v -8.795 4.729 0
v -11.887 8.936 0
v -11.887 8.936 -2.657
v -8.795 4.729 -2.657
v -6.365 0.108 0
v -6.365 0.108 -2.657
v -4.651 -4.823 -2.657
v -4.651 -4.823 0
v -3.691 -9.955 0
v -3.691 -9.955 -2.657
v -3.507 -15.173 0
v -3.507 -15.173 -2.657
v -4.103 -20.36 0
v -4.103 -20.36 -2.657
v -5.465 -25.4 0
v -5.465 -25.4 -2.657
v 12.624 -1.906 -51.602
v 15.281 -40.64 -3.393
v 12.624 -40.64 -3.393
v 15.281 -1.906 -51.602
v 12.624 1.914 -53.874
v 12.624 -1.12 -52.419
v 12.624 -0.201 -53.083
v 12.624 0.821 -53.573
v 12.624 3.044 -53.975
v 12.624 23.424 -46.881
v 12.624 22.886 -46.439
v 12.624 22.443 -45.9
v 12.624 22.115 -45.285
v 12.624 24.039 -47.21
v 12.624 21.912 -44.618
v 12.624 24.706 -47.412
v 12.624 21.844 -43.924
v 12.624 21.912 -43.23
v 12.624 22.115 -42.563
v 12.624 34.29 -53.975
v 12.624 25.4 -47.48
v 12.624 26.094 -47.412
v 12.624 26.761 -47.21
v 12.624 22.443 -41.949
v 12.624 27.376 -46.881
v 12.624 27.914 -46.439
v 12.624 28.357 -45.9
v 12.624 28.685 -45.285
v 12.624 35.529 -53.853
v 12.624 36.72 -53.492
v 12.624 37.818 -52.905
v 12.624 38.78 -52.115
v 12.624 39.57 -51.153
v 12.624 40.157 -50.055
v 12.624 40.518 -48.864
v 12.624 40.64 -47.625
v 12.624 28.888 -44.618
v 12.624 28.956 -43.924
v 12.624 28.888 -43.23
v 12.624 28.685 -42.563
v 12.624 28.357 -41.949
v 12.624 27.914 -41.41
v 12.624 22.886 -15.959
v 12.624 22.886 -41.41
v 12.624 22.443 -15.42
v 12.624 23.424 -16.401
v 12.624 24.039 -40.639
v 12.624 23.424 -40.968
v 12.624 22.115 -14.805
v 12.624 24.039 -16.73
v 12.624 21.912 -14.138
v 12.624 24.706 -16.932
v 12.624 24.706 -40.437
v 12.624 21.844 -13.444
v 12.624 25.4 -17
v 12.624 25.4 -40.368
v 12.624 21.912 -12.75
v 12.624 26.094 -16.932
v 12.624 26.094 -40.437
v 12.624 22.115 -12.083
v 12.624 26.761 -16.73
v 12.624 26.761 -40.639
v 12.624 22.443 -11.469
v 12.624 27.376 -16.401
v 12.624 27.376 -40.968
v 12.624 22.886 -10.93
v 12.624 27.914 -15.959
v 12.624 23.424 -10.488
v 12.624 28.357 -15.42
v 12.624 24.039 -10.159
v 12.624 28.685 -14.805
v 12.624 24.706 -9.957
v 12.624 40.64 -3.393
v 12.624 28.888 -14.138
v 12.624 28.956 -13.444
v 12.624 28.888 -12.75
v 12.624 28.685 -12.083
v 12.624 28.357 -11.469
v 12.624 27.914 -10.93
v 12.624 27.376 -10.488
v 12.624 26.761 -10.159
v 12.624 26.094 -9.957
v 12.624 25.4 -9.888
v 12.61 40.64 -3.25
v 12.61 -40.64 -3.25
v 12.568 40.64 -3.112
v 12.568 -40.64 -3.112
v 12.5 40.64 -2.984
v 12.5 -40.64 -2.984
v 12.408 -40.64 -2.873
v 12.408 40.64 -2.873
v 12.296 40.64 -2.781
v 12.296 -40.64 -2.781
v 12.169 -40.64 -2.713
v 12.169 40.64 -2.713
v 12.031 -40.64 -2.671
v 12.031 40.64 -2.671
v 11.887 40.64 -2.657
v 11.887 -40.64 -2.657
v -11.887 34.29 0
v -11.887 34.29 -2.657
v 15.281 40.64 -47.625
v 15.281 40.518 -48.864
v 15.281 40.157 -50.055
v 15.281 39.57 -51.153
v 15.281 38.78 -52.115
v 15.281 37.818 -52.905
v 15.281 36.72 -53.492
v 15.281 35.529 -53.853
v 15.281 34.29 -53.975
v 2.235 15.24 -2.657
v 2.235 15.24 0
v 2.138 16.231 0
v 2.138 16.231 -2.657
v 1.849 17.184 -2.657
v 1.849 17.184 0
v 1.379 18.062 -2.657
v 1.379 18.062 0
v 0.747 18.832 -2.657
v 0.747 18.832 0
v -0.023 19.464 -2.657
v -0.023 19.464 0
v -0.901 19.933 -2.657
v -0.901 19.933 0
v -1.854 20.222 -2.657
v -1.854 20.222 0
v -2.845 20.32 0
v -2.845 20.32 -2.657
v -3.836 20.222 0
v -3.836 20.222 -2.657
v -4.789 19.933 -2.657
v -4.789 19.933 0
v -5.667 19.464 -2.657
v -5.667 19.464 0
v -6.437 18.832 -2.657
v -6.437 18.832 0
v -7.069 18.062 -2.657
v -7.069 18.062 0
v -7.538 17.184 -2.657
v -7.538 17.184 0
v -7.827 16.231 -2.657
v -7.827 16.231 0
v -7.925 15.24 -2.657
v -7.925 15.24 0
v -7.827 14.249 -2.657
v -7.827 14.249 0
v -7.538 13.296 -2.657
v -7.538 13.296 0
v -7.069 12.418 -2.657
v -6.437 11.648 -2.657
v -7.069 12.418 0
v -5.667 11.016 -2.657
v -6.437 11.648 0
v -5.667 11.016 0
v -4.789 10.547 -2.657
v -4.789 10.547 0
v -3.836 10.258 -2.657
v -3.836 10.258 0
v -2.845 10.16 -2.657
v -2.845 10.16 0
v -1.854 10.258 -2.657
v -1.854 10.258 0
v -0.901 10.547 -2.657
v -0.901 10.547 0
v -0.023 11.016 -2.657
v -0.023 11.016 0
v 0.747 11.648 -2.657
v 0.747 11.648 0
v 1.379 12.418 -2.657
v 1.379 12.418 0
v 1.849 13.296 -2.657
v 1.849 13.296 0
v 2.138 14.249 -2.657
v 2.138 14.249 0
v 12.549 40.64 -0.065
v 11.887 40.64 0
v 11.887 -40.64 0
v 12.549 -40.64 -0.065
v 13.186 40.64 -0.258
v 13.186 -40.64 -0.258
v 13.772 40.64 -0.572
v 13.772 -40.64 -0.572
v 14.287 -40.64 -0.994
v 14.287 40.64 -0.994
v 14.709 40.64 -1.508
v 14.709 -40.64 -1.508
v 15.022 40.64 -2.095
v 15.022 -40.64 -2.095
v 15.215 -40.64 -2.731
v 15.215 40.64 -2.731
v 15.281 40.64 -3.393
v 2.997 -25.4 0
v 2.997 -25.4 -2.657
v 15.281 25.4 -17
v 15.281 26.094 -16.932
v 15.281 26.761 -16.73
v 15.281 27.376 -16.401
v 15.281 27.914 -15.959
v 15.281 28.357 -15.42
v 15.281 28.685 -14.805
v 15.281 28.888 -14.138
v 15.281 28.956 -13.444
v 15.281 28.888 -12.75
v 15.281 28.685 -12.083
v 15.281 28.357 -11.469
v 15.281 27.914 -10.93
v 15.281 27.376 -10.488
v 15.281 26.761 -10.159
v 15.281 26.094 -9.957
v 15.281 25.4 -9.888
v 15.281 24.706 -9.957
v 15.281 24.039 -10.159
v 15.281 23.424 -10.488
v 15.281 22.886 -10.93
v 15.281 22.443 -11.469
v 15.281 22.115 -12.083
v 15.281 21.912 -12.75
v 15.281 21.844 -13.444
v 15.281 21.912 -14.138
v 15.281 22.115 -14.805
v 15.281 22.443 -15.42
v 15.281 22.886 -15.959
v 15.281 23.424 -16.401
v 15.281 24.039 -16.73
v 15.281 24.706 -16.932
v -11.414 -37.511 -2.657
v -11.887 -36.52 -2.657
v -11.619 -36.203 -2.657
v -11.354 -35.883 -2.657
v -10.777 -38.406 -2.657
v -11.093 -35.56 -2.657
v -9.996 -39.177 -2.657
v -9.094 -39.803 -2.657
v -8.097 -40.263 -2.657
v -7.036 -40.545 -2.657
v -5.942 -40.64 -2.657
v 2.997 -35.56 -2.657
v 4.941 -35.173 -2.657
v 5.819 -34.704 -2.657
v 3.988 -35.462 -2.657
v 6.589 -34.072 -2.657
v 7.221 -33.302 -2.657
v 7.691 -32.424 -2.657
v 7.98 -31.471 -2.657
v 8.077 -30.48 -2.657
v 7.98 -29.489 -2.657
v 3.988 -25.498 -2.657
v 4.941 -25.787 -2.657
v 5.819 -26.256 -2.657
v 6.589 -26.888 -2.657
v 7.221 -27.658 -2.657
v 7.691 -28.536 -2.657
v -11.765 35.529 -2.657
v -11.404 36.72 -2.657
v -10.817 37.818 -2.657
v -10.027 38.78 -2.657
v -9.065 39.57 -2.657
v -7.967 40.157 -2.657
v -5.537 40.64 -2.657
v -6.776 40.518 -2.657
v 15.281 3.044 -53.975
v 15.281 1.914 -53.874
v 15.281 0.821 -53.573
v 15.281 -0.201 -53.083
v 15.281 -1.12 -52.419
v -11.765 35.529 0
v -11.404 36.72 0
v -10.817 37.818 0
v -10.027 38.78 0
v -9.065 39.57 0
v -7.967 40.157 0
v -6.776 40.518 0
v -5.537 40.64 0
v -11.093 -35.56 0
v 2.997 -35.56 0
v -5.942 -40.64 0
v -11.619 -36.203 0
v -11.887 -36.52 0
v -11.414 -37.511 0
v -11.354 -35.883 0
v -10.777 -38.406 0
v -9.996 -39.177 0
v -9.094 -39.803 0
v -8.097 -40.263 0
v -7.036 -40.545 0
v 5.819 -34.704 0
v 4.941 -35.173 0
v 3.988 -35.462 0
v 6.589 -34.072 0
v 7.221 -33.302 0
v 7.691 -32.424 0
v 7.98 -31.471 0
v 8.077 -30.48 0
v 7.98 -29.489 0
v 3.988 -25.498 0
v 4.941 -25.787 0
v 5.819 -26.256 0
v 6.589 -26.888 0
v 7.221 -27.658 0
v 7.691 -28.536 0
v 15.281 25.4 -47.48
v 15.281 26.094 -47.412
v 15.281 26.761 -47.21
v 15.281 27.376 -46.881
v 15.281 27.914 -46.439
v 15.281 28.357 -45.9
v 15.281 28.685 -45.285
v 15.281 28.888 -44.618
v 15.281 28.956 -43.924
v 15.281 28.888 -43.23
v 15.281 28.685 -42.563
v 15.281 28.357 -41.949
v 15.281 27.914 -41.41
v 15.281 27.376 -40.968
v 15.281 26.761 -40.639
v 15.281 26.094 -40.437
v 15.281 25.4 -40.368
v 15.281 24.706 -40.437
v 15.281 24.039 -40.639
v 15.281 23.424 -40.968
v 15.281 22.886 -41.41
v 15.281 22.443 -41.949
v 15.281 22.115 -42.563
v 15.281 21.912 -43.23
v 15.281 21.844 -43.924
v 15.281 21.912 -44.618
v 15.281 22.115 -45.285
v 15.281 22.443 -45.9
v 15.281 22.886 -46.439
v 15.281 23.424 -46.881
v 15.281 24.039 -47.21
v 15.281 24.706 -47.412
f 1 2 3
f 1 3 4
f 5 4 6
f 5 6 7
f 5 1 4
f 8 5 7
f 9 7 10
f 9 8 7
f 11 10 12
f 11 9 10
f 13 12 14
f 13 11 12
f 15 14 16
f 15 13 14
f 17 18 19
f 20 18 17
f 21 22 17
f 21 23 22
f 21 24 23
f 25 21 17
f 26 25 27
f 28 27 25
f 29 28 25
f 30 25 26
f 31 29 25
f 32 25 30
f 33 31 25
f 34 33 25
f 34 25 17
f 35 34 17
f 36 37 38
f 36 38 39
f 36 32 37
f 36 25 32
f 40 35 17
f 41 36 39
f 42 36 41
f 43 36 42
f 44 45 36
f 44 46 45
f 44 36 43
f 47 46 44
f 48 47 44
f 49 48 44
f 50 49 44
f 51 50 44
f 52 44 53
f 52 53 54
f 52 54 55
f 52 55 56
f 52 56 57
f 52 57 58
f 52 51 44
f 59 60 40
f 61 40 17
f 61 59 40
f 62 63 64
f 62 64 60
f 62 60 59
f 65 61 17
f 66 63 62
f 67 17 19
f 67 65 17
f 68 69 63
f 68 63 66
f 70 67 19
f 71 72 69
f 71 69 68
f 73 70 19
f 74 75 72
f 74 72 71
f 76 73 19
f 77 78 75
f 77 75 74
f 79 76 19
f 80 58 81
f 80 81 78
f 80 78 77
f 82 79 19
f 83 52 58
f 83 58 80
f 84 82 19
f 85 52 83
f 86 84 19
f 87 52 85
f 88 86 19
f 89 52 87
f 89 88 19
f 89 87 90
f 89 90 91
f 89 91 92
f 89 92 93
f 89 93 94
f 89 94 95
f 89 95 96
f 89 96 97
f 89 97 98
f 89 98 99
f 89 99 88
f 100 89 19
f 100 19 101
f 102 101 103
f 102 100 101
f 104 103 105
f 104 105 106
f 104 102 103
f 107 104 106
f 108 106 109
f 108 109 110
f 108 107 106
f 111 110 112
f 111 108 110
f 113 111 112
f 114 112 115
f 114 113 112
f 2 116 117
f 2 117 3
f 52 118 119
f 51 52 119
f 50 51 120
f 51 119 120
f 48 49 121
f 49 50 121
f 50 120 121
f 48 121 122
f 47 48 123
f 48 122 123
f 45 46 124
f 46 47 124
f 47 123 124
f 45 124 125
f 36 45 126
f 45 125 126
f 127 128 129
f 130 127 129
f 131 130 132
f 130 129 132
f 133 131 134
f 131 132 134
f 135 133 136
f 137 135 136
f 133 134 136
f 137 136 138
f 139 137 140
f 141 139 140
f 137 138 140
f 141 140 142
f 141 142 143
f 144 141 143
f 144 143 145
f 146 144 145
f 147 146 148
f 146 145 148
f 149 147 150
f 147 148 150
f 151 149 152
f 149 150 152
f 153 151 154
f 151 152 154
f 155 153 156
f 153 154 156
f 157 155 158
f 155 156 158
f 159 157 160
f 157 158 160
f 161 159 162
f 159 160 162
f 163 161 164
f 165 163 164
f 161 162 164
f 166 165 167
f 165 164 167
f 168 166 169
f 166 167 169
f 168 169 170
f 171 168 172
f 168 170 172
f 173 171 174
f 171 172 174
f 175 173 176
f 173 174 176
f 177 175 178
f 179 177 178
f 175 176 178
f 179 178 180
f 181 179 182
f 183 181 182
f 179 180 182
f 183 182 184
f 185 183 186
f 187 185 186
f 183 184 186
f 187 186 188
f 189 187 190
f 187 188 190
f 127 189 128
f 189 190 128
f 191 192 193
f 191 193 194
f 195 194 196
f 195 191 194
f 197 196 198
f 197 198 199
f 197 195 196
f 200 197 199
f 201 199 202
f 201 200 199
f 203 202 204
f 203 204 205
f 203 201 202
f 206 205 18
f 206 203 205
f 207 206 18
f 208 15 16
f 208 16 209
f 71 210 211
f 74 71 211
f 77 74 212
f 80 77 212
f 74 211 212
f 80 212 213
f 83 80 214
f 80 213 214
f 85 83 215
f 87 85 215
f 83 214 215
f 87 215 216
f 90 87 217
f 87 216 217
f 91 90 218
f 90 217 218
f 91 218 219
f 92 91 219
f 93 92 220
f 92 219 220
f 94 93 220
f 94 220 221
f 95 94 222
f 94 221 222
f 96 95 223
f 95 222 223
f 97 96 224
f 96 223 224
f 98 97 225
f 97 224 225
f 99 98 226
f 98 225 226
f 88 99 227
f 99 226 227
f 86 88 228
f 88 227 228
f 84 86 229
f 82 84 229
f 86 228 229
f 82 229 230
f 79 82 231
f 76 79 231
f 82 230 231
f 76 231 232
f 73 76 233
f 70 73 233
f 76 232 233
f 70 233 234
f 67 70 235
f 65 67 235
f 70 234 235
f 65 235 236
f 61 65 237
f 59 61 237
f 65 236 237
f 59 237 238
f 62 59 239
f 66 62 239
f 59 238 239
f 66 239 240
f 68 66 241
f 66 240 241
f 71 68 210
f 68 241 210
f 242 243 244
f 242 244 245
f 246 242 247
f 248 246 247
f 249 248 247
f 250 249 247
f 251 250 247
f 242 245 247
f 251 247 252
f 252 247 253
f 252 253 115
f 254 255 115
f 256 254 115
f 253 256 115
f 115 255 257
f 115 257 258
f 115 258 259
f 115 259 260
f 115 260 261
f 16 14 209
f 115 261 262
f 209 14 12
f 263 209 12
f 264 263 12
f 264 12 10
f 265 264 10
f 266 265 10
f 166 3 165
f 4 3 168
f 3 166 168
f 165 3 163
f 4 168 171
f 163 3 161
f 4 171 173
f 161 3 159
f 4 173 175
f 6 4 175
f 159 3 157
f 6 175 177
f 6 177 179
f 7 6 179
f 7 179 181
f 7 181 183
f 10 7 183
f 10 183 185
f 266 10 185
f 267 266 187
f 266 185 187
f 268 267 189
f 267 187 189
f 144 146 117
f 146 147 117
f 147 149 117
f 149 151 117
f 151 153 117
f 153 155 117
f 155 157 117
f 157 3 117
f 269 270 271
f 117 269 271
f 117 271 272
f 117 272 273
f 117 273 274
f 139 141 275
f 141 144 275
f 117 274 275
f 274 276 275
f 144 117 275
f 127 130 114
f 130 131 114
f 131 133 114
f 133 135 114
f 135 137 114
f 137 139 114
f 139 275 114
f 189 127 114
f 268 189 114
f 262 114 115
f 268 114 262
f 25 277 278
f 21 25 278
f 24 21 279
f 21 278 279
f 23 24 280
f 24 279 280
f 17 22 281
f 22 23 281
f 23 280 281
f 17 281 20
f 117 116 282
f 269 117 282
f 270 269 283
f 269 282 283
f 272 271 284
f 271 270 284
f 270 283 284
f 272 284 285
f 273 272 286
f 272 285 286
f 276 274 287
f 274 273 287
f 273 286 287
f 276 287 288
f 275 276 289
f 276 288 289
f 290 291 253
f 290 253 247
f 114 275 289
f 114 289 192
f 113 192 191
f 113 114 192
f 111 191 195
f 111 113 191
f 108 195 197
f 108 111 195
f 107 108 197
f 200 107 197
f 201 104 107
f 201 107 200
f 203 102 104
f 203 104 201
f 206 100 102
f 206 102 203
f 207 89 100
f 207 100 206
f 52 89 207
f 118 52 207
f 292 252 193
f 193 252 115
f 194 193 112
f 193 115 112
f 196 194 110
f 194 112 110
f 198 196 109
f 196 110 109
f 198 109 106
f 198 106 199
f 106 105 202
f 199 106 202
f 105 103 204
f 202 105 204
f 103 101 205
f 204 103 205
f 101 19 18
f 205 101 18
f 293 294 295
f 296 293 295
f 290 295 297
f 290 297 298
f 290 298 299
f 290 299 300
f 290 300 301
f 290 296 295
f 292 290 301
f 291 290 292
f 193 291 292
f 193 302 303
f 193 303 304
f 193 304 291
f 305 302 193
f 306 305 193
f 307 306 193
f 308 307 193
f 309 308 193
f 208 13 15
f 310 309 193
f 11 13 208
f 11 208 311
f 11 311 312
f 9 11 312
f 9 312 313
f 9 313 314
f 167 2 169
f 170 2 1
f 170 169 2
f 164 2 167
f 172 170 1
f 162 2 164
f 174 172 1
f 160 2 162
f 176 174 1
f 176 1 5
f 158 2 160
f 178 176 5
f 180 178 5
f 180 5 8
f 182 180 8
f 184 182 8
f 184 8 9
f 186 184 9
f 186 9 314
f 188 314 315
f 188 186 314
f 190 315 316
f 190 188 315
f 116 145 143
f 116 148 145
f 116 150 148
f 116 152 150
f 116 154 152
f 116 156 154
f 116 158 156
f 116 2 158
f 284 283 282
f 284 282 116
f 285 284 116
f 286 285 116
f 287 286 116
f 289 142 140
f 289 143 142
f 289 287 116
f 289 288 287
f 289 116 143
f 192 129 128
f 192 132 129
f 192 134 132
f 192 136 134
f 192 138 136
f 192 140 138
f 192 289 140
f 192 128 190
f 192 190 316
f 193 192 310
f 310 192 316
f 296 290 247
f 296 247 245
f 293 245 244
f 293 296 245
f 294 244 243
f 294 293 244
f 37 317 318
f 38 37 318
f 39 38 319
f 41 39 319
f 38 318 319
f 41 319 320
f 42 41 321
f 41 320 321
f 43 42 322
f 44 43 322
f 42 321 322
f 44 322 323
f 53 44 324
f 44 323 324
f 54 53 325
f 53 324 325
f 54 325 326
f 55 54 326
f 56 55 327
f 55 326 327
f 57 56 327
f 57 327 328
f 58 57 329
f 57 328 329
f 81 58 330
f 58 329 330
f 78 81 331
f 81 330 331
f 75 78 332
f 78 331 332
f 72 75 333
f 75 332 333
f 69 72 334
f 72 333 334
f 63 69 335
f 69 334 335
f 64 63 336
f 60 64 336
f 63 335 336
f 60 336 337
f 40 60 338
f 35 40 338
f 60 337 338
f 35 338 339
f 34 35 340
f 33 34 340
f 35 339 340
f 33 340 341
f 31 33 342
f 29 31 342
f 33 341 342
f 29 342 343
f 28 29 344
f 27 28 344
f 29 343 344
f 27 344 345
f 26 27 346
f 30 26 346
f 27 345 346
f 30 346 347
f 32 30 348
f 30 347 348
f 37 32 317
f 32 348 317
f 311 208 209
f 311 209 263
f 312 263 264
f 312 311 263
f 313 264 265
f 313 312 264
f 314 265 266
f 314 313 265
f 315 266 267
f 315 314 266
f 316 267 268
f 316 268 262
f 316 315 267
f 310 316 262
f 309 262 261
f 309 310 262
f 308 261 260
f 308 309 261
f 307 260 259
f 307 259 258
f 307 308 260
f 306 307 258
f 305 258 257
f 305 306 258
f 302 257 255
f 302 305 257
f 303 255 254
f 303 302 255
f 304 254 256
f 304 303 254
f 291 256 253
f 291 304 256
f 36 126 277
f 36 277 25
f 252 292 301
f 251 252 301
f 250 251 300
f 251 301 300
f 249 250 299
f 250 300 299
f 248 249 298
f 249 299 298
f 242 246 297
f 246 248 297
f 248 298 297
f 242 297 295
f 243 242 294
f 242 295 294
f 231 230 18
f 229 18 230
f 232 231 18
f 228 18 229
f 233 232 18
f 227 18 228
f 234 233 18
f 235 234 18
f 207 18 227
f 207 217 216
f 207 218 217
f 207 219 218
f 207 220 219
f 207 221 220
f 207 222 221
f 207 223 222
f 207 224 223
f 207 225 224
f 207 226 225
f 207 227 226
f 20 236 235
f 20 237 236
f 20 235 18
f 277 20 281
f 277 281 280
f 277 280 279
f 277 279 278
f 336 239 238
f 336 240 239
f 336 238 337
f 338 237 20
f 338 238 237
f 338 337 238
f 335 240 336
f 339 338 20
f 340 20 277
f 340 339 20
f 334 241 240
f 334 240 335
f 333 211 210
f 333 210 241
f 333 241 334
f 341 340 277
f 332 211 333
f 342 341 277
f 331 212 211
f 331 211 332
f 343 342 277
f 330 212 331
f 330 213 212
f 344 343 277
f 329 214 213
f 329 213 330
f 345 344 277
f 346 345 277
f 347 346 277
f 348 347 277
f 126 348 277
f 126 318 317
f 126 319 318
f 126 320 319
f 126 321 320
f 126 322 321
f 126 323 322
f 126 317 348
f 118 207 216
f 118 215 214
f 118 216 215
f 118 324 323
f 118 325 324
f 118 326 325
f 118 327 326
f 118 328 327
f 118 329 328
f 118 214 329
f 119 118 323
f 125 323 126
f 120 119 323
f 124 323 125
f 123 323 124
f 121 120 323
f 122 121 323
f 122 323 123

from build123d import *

# Parameters (mm, degrees)
SKETCH2_R          = 5.08
BASE_FLANGE2_DEPTH = 2.65684
EDGE_FLANGE2_DEPTH = 81.28
SKETCH18_R         = 3.556
CUT_EXTRUDE1_DEPTH = 2.65684
FILLET1_R          = 6.35


# Sheet-metal steps are written as plain solids
with BuildPart() as part:
    # Sketch2 → Base-Flange2 (new body)
    with BuildSketch(Plane.XY):
        with BuildLine():
            Line((-11.8872, -36.520431679), (-11.8872, -40.64))
            Line((-11.8872, -40.64), (11.8872, -40.64))
            Line((11.8872, -40.64), (11.8872, 40.64))
            Line((11.8872, 40.64), (-11.8872, 40.64))
            Line((-11.8872, 40.64), (-11.8872, 8.936031679))
            ThreePointArc((-11.8872, 8.936031679), (-4.075086446, -7.37142183), (-5.465240134, -25.4))
            Line((-5.465240134, -25.4), (2.9972, -25.4))
            ThreePointArc((2.9972, -25.4), (8.0772, -30.48), (2.9972, -35.56))
            Line((2.9972, -35.56), (-11.093291287, -35.56))
            ThreePointArc((-11.093291287, -35.56), (-11.485961922, -36.043756834), (-11.8872, -36.520431679))
        make_face()
        with Locations((-2.8448, 15.24)):
            Circle(SKETCH2_R, mode=Mode.SUBTRACT)
    extrude(amount=-BASE_FLANGE2_DEPTH)

    # Edge-Flange2 section (across the edge) → Edge-Flange2 (add)
    with BuildSketch(Plane(origin=(12.6238, 40.64, -2.65684), x_dir=(-1, 0, 0), z_dir=(0, -1, 0))):
        with BuildLine():
            Line((-2.65684, 0.7366), (-2.65684, 51.31816))
            Line((-2.65684, 51.31816), (0, 51.31816))
            Line((0, 51.31816), (0, 0.7366))
            ThreePointArc((0, 0.7366), (0.215745145, 0.215745145), (0.7366, 0))
            Line((0.7366, 0), (0.7366, -2.65684))
            ThreePointArc((0.7366, -2.65684), (-1.662924436, -1.662924436), (-2.65684, 0.7366))
        make_face()
    extrude(amount=EDGE_FLANGE2_DEPTH)

    # Sketch18 → Cut-Extrude1 (cut)
    with BuildSketch(Plane(origin=(15.28064, 0, 0), x_dir=(0, 0, -1), z_dir=(1, 0, 0))):
        with Locations((13.44422, 25.4)):
            Circle(SKETCH18_R)
        with Locations((43.92422, 25.4)):
            Circle(SKETCH18_R)
        Polygon((53.975, 0), (53.975, -40.64), (3.39344, -40.64), align=None)
    extrude(amount=-CUT_EXTRUDE1_DEPTH, mode=Mode.SUBTRACT)

    # Fillet1
    # the kernel refuses this fillet: 6.35 mm, written as the material it takes off along each edge
    with BuildSketch(Plane(origin=(-11.8872, 40.64, 15.875), x_dir=(0, -1, 0), z_dir=(0, 0, -1)), Plane(origin=(31.15564, 40.64, -53.975), x_dir=(0, 0, 1), z_dir=(-1, 0, 0))) as fillet1_piece_1:
        with BuildLine():
            CenterArc((FILLET1_R, -FILLET1_R), FILLET1_R, 90, 90)
            Line((0, -FILLET1_R), (-FILLET1_R * 0.02, -FILLET1_R))
            Line((-FILLET1_R * 0.02, -FILLET1_R), (-FILLET1_R * 0.02, FILLET1_R * 0.02))
            Line((-FILLET1_R * 0.02, FILLET1_R * 0.02), (FILLET1_R, FILLET1_R * 0.02))
            Line((FILLET1_R, FILLET1_R * 0.02), (FILLET1_R, 0))
        make_face()
    extrude(amount=34.40684, mode=Mode.SUBTRACT)
    with BuildSketch(Plane(origin=(-11.8872, -40.64, 14.863477581), x_dir=(0, 1, 0), z_dir=(0, 0, -1))) as fillet1_piece_2:
        with BuildLine():
            CenterArc((6.35, 5.945391032), FILLET1_R, 180, 69.436266332)
            Line((0, 5.945391032), (-0.127, 5.945391032))
            Line((-0.127, 5.945391032), (-0.127, 0))
            Line((-0.127, 0), (0, -0.127))
            ThreePointArc((0, -0.127), (2.059784161, -0.127), (4.074959688, -0.118907821))
            Line((4.074959688, -0.118907821), (4.119568321, 0))
        make_face()
    extrude(amount=32.383795161, mode=Mode.SUBTRACT)
    with BuildSketch(Plane(origin=(22.890020574, 0, -53.975), x_dir=(-2.7142023433715092e-15, -0.6263358882152561, 0.7795533048699147), z_dir=(-1, 0, 0))) as fillet1_piece_3:
        with BuildLine():
            CenterArc((FILLET1_R * 0.479331059788, FILLET1_R), FILLET1_R, 218.780305406, 51.219694594)
            Line((-FILLET1_R * 0.300222245082, FILLET1_R * 0.373664111785), (-FILLET1_R * 0.315813311179, FILLET1_R * 0.36113739402))
            Line((-FILLET1_R * 0.315813311179, FILLET1_R * 0.36113739402), (-FILLET1_R * 0.00958662119577, -FILLET1_R * 0.02))
            Line((-FILLET1_R * 0.00958662119577, -FILLET1_R * 0.02), (FILLET1_R * 0.479331059788, -FILLET1_R * 0.02))
            Line((FILLET1_R * 0.479331059788, -FILLET1_R * 0.02), (FILLET1_R * 0.479331059788, 0))
        make_face()
    extrude(amount=17.875601148, mode=Mode.SUBTRACT)


solid = part.part
